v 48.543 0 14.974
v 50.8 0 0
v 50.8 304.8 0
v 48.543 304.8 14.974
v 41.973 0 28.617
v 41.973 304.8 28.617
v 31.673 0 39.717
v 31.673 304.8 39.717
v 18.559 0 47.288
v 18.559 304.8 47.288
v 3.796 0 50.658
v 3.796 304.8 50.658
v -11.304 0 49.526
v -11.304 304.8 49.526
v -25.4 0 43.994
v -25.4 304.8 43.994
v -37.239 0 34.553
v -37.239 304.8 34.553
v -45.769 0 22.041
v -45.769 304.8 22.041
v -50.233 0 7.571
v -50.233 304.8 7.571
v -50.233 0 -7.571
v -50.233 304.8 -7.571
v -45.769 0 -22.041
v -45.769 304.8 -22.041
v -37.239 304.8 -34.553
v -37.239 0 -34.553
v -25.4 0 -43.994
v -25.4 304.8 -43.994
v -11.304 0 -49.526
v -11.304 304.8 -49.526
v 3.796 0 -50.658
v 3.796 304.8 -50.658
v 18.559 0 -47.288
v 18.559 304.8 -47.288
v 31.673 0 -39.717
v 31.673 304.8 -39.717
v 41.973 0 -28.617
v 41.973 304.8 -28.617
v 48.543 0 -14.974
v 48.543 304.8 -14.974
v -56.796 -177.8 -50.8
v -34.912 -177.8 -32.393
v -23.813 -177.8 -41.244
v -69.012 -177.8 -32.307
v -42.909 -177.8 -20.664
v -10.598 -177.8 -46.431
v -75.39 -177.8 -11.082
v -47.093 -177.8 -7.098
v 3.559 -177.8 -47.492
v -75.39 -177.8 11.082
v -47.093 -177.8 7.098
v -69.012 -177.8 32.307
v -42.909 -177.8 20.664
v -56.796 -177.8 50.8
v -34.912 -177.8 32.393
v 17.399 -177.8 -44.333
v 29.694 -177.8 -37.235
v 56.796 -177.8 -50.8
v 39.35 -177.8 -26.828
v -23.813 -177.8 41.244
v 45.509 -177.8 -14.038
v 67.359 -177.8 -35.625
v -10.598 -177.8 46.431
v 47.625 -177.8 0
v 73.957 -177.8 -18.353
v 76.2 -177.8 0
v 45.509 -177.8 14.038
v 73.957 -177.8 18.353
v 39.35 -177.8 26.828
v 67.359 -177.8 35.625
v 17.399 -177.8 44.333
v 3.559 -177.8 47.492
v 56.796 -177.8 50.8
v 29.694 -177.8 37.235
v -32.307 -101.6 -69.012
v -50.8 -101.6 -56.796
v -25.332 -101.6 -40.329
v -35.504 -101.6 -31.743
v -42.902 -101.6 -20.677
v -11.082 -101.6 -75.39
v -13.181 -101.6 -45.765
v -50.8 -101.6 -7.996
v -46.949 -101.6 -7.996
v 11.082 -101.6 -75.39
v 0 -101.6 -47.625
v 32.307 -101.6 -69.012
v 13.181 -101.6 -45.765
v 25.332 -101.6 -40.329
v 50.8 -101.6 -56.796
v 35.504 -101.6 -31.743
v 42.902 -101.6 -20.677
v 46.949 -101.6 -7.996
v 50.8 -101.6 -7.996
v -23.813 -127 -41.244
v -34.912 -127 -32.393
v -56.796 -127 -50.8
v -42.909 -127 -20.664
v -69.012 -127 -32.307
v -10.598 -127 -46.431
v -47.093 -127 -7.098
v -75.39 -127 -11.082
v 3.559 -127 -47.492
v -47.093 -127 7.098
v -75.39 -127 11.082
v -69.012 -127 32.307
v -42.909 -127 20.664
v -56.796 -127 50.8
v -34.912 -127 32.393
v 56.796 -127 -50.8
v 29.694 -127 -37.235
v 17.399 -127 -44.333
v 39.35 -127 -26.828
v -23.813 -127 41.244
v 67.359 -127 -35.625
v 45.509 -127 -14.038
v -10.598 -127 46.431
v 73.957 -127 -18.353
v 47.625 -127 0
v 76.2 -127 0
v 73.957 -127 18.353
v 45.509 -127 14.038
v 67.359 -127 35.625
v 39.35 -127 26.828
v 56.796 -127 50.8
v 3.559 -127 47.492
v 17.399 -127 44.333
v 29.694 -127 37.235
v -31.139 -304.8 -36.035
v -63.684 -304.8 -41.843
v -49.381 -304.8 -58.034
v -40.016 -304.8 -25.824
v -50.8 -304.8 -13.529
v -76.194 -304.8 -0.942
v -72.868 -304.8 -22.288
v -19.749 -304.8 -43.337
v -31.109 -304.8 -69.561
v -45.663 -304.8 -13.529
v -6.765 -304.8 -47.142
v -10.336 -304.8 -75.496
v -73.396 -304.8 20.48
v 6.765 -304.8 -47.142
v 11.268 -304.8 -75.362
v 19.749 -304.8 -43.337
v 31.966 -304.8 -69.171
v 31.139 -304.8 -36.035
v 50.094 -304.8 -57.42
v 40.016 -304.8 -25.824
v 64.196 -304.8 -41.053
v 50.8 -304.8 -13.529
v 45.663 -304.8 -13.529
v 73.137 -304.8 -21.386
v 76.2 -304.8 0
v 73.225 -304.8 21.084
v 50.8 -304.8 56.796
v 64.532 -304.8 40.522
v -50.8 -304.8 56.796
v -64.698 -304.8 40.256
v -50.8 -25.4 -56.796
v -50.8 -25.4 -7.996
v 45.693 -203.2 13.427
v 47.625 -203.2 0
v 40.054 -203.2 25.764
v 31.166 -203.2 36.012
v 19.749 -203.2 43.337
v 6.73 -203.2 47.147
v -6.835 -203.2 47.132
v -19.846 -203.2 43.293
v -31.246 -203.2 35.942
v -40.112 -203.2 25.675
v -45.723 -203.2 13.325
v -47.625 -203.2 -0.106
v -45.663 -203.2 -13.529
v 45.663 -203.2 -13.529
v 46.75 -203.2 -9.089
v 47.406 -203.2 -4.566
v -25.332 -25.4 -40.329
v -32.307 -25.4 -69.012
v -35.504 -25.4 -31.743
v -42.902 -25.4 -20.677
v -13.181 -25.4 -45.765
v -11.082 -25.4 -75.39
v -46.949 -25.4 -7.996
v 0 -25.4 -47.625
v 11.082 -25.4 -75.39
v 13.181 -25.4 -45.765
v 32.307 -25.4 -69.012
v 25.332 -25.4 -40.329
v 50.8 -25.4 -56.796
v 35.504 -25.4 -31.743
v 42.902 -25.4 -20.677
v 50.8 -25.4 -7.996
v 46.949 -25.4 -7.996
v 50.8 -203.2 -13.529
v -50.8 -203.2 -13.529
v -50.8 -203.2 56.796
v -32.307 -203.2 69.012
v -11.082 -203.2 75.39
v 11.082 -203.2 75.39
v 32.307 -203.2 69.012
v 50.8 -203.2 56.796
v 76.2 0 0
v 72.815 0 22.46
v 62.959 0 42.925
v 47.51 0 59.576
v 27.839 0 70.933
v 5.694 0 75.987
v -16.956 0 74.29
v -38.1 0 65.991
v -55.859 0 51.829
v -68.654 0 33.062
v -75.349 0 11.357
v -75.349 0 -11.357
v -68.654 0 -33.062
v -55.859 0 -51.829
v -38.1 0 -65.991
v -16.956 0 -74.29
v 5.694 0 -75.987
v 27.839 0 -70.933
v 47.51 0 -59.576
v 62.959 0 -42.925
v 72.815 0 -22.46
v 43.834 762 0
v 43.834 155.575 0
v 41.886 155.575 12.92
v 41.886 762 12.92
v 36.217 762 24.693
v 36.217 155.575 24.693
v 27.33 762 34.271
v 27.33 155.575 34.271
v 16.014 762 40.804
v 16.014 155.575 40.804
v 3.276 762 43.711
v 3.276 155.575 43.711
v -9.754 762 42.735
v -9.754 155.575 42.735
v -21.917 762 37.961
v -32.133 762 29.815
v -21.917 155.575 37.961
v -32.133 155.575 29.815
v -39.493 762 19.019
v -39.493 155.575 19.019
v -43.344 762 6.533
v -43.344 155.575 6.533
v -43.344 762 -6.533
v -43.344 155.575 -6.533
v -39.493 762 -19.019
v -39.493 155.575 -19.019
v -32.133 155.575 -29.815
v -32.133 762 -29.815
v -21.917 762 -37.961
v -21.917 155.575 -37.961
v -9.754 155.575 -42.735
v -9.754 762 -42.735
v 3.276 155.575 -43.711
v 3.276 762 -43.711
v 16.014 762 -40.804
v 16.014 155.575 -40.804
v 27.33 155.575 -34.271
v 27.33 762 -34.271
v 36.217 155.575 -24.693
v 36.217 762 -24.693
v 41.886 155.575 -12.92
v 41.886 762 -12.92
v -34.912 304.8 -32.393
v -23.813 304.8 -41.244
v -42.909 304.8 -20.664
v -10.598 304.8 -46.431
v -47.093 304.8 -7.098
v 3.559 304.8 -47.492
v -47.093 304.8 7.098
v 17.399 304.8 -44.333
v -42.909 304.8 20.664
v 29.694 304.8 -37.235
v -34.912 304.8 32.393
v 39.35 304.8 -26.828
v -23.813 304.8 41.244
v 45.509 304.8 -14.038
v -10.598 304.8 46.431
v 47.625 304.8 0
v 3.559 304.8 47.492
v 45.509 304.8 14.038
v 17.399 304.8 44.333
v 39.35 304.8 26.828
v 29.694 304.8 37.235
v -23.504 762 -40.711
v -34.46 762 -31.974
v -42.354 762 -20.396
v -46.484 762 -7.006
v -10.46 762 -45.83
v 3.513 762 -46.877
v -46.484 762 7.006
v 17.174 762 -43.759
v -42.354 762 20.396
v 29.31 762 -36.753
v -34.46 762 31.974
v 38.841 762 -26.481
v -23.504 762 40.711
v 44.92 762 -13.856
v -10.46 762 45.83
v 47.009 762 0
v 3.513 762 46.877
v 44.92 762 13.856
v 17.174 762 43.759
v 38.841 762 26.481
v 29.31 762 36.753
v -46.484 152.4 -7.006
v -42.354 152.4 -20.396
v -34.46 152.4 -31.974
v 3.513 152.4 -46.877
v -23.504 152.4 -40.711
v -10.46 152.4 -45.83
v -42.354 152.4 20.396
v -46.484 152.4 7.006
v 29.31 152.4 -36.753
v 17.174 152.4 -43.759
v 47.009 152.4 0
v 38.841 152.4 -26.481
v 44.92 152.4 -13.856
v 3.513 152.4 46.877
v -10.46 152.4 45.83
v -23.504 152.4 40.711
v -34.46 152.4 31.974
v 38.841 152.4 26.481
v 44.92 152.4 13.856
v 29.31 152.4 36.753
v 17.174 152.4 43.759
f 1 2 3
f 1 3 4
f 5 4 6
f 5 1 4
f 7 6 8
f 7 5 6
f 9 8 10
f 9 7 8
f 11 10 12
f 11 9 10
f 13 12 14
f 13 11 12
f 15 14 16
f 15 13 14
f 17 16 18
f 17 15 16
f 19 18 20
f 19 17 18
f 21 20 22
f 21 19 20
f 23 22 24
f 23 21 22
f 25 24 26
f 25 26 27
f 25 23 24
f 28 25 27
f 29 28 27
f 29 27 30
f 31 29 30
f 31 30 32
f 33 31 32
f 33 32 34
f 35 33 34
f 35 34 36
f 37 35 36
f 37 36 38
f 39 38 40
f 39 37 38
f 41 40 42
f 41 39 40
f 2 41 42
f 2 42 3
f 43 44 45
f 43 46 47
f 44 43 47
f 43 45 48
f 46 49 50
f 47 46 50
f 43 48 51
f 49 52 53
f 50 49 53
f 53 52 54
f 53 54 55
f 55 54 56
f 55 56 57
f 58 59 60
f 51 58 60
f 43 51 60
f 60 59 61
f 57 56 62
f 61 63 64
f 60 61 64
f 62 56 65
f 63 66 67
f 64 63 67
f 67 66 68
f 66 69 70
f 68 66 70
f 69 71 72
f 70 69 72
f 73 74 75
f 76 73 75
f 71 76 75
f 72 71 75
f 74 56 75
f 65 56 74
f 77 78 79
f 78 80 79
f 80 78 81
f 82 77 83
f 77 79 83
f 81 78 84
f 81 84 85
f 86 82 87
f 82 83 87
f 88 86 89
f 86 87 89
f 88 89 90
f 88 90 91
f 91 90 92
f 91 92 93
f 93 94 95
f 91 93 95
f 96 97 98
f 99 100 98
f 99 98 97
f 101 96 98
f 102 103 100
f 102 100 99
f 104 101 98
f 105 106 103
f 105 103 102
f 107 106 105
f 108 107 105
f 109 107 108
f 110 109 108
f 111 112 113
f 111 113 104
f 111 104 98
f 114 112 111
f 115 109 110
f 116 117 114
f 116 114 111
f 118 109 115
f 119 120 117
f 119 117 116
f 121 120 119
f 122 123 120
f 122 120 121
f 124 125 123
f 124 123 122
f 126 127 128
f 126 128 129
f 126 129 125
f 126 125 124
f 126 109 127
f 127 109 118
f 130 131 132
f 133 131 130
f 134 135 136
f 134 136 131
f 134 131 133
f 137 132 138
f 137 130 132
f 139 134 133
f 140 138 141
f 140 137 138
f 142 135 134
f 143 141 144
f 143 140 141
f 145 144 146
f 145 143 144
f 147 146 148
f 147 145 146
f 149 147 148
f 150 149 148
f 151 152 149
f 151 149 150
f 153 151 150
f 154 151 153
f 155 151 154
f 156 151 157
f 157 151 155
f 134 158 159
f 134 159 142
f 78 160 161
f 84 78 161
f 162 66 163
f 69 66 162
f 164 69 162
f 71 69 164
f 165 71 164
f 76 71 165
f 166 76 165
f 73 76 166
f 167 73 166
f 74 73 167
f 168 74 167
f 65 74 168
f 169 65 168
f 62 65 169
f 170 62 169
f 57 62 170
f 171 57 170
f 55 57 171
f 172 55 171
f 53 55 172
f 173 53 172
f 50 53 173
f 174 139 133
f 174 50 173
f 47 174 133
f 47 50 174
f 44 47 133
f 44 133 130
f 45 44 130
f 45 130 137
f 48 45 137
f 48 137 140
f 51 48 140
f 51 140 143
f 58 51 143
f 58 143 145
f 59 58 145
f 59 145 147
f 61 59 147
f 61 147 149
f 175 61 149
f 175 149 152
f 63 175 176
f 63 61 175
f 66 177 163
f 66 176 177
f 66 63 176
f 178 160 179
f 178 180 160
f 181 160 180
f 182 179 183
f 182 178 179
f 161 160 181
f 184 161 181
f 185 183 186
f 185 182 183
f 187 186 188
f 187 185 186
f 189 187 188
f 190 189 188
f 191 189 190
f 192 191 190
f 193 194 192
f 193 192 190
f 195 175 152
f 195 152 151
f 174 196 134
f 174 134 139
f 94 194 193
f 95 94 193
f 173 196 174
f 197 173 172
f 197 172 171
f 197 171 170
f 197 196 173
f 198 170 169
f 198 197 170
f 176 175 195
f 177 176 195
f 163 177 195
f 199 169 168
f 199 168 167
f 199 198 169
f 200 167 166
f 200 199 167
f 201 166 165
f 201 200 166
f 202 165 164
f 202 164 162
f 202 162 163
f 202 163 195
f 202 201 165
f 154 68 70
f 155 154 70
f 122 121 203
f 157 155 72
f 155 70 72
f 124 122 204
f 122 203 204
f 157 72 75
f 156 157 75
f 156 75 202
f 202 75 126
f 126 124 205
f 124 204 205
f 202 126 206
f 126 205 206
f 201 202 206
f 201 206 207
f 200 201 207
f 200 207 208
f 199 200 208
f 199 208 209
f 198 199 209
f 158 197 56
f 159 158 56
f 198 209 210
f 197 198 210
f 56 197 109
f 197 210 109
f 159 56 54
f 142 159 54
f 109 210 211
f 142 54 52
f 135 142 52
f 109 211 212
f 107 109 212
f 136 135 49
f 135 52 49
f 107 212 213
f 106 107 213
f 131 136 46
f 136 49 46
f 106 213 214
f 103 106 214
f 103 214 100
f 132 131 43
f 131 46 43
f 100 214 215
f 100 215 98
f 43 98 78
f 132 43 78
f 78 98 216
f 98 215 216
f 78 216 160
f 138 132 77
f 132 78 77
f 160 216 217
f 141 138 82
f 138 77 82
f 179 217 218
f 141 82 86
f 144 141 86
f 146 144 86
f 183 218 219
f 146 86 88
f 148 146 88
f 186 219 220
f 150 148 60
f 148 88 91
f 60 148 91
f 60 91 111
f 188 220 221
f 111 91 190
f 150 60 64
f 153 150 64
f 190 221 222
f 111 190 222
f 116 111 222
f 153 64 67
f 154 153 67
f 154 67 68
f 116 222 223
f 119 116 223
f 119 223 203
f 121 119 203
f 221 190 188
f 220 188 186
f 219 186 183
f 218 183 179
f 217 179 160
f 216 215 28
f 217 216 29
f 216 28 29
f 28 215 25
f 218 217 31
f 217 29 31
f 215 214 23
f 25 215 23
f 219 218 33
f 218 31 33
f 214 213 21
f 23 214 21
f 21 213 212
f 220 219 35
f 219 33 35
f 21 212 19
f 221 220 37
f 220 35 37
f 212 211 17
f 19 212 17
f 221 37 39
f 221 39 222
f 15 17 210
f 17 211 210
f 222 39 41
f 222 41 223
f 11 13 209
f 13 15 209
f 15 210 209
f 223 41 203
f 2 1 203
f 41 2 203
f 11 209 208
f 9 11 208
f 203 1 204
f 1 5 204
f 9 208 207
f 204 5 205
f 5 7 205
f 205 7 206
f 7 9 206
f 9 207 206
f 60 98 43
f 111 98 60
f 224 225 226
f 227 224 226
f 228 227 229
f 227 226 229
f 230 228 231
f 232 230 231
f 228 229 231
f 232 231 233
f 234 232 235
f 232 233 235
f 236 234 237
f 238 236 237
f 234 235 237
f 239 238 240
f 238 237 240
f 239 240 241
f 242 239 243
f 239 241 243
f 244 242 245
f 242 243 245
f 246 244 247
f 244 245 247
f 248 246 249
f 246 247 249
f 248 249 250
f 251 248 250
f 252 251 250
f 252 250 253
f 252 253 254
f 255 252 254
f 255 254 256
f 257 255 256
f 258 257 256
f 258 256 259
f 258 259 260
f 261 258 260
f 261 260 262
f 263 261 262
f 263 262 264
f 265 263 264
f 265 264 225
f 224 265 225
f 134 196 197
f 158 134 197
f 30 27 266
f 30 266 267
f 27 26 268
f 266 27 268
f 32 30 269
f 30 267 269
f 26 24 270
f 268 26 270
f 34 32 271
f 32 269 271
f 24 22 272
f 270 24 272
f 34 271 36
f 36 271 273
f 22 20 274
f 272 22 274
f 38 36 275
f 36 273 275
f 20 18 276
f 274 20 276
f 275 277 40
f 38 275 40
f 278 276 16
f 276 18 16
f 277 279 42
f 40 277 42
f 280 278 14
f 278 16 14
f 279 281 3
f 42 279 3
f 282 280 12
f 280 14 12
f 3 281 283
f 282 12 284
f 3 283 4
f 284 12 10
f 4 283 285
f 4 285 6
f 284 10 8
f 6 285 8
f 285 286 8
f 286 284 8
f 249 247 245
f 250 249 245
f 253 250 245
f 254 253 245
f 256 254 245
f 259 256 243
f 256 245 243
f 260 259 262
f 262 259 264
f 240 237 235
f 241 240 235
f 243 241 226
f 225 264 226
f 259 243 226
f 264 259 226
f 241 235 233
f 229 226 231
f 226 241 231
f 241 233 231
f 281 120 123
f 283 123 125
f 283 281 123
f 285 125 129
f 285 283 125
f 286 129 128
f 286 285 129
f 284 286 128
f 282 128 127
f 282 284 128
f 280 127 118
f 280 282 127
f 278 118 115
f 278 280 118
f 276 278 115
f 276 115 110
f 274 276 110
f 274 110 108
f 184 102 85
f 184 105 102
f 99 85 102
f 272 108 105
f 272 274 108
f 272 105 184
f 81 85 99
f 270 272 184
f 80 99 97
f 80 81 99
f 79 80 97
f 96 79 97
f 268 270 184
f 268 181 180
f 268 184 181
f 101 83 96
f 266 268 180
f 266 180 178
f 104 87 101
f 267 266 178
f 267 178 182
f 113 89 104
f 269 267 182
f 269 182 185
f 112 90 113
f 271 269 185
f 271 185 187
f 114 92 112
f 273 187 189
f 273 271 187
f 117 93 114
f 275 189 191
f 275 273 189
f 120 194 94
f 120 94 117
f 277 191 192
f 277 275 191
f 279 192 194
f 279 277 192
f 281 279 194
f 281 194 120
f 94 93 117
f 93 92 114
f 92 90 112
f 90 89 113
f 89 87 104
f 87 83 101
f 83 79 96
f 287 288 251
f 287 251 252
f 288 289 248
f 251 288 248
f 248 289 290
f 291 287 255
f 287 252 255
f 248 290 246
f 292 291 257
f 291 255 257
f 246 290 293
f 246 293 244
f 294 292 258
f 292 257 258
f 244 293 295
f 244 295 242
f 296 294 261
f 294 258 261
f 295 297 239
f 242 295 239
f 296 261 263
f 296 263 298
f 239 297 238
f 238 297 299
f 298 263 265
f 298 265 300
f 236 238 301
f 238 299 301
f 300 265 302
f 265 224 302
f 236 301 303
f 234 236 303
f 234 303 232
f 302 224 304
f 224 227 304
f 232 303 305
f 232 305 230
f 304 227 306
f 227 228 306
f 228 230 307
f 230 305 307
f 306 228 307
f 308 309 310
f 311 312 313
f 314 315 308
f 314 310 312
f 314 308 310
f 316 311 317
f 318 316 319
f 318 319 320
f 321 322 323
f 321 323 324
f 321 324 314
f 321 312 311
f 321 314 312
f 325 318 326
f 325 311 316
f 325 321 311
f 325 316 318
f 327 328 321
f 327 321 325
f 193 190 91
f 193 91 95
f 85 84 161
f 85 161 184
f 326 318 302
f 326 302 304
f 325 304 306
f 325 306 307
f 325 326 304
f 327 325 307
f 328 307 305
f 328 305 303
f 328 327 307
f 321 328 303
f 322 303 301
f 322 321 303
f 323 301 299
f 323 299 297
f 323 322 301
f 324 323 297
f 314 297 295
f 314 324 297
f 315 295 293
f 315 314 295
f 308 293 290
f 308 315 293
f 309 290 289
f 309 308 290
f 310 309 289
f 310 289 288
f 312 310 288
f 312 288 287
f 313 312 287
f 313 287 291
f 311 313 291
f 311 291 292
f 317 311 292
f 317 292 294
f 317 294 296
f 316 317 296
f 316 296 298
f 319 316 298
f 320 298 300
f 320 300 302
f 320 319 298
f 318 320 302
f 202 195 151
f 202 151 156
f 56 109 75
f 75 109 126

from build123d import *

# Parameters (mm, degrees)
F0_R      = 50.8
F0_R_2    = 47.625
F1_DEPTH  = 304.8
F3_START  = -152.4
F2_R      = 47.0088750141
F2_R_2    = 43.8338750141
F3_DEPTH  = 609.6
F4_START  = -152.4
F4_DEPTH  = 3.175
F5_R      = 76.2
F5_R_2    = 50.8
F6_DEPTH  = 304.8
F8_START  = 127
F7_W      = 152.4
F7_H      = 101.6
F8_DEPTH  = 50.8
F10_START = 203.2
F9_W      = 101.6
F9_H      = 152.4
F10_DEPTH = 101.6
F12_START = 25.4
F11_W     = 101.6
F11_H     = 177.8
F12_DEPTH = 76.2


with BuildPart() as f1:
    # F0 (on Front) → F1 (new body, symmetric)
    with BuildSketch(Plane.XZ):
        Circle(F0_R)
        Circle(F0_R_2, mode=Mode.SUBTRACT)
    extrude(amount=F1_DEPTH, both=True)

    # F5 (on Front) → F6 (join)
    with BuildSketch(Plane.XZ):
        Circle(F5_R)
        Circle(F5_R_2, mode=Mode.SUBTRACT)
    extrude(amount=F6_DEPTH)

    # F7 (on Front) → F8 (cut)
    with BuildSketch(Plane.XZ.offset(F8_START)):
        Rectangle(F7_W, F7_H)
    extrude(amount=F8_DEPTH, mode=Mode.SUBTRACT)

    # F9 (on Front) → F10 (cut)
    with BuildSketch(Plane.XZ.offset(F10_START)):
        with Locations((0, 62.6713027543)):
            Rectangle(F9_W, F9_H)
    extrude(amount=F10_DEPTH, mode=Mode.SUBTRACT)

    # F11 (on Front) → F12 (cut)
    with BuildSketch(Plane.XZ.offset(F12_START)):
        with Locations((0, -96.8955837568)):
            Rectangle(F11_W, F11_H)
    extrude(amount=F12_DEPTH, mode=Mode.SUBTRACT)


with BuildPart() as f3:
    # F2 (on Front) → F3 (new body)
    with BuildSketch(Plane.XZ.offset(F3_START)):
        Circle(F2_R)
        Circle(F2_R_2, mode=Mode.SUBTRACT)
    extrude(amount=-F3_DEPTH)

    # F2 (on Front) → F4 (join)
    with BuildSketch(Plane.XZ.offset(F4_START)):
        Circle(F2_R_2)
    extrude(amount=-F4_DEPTH)


solid = Compound([f1.part, f3.part])
